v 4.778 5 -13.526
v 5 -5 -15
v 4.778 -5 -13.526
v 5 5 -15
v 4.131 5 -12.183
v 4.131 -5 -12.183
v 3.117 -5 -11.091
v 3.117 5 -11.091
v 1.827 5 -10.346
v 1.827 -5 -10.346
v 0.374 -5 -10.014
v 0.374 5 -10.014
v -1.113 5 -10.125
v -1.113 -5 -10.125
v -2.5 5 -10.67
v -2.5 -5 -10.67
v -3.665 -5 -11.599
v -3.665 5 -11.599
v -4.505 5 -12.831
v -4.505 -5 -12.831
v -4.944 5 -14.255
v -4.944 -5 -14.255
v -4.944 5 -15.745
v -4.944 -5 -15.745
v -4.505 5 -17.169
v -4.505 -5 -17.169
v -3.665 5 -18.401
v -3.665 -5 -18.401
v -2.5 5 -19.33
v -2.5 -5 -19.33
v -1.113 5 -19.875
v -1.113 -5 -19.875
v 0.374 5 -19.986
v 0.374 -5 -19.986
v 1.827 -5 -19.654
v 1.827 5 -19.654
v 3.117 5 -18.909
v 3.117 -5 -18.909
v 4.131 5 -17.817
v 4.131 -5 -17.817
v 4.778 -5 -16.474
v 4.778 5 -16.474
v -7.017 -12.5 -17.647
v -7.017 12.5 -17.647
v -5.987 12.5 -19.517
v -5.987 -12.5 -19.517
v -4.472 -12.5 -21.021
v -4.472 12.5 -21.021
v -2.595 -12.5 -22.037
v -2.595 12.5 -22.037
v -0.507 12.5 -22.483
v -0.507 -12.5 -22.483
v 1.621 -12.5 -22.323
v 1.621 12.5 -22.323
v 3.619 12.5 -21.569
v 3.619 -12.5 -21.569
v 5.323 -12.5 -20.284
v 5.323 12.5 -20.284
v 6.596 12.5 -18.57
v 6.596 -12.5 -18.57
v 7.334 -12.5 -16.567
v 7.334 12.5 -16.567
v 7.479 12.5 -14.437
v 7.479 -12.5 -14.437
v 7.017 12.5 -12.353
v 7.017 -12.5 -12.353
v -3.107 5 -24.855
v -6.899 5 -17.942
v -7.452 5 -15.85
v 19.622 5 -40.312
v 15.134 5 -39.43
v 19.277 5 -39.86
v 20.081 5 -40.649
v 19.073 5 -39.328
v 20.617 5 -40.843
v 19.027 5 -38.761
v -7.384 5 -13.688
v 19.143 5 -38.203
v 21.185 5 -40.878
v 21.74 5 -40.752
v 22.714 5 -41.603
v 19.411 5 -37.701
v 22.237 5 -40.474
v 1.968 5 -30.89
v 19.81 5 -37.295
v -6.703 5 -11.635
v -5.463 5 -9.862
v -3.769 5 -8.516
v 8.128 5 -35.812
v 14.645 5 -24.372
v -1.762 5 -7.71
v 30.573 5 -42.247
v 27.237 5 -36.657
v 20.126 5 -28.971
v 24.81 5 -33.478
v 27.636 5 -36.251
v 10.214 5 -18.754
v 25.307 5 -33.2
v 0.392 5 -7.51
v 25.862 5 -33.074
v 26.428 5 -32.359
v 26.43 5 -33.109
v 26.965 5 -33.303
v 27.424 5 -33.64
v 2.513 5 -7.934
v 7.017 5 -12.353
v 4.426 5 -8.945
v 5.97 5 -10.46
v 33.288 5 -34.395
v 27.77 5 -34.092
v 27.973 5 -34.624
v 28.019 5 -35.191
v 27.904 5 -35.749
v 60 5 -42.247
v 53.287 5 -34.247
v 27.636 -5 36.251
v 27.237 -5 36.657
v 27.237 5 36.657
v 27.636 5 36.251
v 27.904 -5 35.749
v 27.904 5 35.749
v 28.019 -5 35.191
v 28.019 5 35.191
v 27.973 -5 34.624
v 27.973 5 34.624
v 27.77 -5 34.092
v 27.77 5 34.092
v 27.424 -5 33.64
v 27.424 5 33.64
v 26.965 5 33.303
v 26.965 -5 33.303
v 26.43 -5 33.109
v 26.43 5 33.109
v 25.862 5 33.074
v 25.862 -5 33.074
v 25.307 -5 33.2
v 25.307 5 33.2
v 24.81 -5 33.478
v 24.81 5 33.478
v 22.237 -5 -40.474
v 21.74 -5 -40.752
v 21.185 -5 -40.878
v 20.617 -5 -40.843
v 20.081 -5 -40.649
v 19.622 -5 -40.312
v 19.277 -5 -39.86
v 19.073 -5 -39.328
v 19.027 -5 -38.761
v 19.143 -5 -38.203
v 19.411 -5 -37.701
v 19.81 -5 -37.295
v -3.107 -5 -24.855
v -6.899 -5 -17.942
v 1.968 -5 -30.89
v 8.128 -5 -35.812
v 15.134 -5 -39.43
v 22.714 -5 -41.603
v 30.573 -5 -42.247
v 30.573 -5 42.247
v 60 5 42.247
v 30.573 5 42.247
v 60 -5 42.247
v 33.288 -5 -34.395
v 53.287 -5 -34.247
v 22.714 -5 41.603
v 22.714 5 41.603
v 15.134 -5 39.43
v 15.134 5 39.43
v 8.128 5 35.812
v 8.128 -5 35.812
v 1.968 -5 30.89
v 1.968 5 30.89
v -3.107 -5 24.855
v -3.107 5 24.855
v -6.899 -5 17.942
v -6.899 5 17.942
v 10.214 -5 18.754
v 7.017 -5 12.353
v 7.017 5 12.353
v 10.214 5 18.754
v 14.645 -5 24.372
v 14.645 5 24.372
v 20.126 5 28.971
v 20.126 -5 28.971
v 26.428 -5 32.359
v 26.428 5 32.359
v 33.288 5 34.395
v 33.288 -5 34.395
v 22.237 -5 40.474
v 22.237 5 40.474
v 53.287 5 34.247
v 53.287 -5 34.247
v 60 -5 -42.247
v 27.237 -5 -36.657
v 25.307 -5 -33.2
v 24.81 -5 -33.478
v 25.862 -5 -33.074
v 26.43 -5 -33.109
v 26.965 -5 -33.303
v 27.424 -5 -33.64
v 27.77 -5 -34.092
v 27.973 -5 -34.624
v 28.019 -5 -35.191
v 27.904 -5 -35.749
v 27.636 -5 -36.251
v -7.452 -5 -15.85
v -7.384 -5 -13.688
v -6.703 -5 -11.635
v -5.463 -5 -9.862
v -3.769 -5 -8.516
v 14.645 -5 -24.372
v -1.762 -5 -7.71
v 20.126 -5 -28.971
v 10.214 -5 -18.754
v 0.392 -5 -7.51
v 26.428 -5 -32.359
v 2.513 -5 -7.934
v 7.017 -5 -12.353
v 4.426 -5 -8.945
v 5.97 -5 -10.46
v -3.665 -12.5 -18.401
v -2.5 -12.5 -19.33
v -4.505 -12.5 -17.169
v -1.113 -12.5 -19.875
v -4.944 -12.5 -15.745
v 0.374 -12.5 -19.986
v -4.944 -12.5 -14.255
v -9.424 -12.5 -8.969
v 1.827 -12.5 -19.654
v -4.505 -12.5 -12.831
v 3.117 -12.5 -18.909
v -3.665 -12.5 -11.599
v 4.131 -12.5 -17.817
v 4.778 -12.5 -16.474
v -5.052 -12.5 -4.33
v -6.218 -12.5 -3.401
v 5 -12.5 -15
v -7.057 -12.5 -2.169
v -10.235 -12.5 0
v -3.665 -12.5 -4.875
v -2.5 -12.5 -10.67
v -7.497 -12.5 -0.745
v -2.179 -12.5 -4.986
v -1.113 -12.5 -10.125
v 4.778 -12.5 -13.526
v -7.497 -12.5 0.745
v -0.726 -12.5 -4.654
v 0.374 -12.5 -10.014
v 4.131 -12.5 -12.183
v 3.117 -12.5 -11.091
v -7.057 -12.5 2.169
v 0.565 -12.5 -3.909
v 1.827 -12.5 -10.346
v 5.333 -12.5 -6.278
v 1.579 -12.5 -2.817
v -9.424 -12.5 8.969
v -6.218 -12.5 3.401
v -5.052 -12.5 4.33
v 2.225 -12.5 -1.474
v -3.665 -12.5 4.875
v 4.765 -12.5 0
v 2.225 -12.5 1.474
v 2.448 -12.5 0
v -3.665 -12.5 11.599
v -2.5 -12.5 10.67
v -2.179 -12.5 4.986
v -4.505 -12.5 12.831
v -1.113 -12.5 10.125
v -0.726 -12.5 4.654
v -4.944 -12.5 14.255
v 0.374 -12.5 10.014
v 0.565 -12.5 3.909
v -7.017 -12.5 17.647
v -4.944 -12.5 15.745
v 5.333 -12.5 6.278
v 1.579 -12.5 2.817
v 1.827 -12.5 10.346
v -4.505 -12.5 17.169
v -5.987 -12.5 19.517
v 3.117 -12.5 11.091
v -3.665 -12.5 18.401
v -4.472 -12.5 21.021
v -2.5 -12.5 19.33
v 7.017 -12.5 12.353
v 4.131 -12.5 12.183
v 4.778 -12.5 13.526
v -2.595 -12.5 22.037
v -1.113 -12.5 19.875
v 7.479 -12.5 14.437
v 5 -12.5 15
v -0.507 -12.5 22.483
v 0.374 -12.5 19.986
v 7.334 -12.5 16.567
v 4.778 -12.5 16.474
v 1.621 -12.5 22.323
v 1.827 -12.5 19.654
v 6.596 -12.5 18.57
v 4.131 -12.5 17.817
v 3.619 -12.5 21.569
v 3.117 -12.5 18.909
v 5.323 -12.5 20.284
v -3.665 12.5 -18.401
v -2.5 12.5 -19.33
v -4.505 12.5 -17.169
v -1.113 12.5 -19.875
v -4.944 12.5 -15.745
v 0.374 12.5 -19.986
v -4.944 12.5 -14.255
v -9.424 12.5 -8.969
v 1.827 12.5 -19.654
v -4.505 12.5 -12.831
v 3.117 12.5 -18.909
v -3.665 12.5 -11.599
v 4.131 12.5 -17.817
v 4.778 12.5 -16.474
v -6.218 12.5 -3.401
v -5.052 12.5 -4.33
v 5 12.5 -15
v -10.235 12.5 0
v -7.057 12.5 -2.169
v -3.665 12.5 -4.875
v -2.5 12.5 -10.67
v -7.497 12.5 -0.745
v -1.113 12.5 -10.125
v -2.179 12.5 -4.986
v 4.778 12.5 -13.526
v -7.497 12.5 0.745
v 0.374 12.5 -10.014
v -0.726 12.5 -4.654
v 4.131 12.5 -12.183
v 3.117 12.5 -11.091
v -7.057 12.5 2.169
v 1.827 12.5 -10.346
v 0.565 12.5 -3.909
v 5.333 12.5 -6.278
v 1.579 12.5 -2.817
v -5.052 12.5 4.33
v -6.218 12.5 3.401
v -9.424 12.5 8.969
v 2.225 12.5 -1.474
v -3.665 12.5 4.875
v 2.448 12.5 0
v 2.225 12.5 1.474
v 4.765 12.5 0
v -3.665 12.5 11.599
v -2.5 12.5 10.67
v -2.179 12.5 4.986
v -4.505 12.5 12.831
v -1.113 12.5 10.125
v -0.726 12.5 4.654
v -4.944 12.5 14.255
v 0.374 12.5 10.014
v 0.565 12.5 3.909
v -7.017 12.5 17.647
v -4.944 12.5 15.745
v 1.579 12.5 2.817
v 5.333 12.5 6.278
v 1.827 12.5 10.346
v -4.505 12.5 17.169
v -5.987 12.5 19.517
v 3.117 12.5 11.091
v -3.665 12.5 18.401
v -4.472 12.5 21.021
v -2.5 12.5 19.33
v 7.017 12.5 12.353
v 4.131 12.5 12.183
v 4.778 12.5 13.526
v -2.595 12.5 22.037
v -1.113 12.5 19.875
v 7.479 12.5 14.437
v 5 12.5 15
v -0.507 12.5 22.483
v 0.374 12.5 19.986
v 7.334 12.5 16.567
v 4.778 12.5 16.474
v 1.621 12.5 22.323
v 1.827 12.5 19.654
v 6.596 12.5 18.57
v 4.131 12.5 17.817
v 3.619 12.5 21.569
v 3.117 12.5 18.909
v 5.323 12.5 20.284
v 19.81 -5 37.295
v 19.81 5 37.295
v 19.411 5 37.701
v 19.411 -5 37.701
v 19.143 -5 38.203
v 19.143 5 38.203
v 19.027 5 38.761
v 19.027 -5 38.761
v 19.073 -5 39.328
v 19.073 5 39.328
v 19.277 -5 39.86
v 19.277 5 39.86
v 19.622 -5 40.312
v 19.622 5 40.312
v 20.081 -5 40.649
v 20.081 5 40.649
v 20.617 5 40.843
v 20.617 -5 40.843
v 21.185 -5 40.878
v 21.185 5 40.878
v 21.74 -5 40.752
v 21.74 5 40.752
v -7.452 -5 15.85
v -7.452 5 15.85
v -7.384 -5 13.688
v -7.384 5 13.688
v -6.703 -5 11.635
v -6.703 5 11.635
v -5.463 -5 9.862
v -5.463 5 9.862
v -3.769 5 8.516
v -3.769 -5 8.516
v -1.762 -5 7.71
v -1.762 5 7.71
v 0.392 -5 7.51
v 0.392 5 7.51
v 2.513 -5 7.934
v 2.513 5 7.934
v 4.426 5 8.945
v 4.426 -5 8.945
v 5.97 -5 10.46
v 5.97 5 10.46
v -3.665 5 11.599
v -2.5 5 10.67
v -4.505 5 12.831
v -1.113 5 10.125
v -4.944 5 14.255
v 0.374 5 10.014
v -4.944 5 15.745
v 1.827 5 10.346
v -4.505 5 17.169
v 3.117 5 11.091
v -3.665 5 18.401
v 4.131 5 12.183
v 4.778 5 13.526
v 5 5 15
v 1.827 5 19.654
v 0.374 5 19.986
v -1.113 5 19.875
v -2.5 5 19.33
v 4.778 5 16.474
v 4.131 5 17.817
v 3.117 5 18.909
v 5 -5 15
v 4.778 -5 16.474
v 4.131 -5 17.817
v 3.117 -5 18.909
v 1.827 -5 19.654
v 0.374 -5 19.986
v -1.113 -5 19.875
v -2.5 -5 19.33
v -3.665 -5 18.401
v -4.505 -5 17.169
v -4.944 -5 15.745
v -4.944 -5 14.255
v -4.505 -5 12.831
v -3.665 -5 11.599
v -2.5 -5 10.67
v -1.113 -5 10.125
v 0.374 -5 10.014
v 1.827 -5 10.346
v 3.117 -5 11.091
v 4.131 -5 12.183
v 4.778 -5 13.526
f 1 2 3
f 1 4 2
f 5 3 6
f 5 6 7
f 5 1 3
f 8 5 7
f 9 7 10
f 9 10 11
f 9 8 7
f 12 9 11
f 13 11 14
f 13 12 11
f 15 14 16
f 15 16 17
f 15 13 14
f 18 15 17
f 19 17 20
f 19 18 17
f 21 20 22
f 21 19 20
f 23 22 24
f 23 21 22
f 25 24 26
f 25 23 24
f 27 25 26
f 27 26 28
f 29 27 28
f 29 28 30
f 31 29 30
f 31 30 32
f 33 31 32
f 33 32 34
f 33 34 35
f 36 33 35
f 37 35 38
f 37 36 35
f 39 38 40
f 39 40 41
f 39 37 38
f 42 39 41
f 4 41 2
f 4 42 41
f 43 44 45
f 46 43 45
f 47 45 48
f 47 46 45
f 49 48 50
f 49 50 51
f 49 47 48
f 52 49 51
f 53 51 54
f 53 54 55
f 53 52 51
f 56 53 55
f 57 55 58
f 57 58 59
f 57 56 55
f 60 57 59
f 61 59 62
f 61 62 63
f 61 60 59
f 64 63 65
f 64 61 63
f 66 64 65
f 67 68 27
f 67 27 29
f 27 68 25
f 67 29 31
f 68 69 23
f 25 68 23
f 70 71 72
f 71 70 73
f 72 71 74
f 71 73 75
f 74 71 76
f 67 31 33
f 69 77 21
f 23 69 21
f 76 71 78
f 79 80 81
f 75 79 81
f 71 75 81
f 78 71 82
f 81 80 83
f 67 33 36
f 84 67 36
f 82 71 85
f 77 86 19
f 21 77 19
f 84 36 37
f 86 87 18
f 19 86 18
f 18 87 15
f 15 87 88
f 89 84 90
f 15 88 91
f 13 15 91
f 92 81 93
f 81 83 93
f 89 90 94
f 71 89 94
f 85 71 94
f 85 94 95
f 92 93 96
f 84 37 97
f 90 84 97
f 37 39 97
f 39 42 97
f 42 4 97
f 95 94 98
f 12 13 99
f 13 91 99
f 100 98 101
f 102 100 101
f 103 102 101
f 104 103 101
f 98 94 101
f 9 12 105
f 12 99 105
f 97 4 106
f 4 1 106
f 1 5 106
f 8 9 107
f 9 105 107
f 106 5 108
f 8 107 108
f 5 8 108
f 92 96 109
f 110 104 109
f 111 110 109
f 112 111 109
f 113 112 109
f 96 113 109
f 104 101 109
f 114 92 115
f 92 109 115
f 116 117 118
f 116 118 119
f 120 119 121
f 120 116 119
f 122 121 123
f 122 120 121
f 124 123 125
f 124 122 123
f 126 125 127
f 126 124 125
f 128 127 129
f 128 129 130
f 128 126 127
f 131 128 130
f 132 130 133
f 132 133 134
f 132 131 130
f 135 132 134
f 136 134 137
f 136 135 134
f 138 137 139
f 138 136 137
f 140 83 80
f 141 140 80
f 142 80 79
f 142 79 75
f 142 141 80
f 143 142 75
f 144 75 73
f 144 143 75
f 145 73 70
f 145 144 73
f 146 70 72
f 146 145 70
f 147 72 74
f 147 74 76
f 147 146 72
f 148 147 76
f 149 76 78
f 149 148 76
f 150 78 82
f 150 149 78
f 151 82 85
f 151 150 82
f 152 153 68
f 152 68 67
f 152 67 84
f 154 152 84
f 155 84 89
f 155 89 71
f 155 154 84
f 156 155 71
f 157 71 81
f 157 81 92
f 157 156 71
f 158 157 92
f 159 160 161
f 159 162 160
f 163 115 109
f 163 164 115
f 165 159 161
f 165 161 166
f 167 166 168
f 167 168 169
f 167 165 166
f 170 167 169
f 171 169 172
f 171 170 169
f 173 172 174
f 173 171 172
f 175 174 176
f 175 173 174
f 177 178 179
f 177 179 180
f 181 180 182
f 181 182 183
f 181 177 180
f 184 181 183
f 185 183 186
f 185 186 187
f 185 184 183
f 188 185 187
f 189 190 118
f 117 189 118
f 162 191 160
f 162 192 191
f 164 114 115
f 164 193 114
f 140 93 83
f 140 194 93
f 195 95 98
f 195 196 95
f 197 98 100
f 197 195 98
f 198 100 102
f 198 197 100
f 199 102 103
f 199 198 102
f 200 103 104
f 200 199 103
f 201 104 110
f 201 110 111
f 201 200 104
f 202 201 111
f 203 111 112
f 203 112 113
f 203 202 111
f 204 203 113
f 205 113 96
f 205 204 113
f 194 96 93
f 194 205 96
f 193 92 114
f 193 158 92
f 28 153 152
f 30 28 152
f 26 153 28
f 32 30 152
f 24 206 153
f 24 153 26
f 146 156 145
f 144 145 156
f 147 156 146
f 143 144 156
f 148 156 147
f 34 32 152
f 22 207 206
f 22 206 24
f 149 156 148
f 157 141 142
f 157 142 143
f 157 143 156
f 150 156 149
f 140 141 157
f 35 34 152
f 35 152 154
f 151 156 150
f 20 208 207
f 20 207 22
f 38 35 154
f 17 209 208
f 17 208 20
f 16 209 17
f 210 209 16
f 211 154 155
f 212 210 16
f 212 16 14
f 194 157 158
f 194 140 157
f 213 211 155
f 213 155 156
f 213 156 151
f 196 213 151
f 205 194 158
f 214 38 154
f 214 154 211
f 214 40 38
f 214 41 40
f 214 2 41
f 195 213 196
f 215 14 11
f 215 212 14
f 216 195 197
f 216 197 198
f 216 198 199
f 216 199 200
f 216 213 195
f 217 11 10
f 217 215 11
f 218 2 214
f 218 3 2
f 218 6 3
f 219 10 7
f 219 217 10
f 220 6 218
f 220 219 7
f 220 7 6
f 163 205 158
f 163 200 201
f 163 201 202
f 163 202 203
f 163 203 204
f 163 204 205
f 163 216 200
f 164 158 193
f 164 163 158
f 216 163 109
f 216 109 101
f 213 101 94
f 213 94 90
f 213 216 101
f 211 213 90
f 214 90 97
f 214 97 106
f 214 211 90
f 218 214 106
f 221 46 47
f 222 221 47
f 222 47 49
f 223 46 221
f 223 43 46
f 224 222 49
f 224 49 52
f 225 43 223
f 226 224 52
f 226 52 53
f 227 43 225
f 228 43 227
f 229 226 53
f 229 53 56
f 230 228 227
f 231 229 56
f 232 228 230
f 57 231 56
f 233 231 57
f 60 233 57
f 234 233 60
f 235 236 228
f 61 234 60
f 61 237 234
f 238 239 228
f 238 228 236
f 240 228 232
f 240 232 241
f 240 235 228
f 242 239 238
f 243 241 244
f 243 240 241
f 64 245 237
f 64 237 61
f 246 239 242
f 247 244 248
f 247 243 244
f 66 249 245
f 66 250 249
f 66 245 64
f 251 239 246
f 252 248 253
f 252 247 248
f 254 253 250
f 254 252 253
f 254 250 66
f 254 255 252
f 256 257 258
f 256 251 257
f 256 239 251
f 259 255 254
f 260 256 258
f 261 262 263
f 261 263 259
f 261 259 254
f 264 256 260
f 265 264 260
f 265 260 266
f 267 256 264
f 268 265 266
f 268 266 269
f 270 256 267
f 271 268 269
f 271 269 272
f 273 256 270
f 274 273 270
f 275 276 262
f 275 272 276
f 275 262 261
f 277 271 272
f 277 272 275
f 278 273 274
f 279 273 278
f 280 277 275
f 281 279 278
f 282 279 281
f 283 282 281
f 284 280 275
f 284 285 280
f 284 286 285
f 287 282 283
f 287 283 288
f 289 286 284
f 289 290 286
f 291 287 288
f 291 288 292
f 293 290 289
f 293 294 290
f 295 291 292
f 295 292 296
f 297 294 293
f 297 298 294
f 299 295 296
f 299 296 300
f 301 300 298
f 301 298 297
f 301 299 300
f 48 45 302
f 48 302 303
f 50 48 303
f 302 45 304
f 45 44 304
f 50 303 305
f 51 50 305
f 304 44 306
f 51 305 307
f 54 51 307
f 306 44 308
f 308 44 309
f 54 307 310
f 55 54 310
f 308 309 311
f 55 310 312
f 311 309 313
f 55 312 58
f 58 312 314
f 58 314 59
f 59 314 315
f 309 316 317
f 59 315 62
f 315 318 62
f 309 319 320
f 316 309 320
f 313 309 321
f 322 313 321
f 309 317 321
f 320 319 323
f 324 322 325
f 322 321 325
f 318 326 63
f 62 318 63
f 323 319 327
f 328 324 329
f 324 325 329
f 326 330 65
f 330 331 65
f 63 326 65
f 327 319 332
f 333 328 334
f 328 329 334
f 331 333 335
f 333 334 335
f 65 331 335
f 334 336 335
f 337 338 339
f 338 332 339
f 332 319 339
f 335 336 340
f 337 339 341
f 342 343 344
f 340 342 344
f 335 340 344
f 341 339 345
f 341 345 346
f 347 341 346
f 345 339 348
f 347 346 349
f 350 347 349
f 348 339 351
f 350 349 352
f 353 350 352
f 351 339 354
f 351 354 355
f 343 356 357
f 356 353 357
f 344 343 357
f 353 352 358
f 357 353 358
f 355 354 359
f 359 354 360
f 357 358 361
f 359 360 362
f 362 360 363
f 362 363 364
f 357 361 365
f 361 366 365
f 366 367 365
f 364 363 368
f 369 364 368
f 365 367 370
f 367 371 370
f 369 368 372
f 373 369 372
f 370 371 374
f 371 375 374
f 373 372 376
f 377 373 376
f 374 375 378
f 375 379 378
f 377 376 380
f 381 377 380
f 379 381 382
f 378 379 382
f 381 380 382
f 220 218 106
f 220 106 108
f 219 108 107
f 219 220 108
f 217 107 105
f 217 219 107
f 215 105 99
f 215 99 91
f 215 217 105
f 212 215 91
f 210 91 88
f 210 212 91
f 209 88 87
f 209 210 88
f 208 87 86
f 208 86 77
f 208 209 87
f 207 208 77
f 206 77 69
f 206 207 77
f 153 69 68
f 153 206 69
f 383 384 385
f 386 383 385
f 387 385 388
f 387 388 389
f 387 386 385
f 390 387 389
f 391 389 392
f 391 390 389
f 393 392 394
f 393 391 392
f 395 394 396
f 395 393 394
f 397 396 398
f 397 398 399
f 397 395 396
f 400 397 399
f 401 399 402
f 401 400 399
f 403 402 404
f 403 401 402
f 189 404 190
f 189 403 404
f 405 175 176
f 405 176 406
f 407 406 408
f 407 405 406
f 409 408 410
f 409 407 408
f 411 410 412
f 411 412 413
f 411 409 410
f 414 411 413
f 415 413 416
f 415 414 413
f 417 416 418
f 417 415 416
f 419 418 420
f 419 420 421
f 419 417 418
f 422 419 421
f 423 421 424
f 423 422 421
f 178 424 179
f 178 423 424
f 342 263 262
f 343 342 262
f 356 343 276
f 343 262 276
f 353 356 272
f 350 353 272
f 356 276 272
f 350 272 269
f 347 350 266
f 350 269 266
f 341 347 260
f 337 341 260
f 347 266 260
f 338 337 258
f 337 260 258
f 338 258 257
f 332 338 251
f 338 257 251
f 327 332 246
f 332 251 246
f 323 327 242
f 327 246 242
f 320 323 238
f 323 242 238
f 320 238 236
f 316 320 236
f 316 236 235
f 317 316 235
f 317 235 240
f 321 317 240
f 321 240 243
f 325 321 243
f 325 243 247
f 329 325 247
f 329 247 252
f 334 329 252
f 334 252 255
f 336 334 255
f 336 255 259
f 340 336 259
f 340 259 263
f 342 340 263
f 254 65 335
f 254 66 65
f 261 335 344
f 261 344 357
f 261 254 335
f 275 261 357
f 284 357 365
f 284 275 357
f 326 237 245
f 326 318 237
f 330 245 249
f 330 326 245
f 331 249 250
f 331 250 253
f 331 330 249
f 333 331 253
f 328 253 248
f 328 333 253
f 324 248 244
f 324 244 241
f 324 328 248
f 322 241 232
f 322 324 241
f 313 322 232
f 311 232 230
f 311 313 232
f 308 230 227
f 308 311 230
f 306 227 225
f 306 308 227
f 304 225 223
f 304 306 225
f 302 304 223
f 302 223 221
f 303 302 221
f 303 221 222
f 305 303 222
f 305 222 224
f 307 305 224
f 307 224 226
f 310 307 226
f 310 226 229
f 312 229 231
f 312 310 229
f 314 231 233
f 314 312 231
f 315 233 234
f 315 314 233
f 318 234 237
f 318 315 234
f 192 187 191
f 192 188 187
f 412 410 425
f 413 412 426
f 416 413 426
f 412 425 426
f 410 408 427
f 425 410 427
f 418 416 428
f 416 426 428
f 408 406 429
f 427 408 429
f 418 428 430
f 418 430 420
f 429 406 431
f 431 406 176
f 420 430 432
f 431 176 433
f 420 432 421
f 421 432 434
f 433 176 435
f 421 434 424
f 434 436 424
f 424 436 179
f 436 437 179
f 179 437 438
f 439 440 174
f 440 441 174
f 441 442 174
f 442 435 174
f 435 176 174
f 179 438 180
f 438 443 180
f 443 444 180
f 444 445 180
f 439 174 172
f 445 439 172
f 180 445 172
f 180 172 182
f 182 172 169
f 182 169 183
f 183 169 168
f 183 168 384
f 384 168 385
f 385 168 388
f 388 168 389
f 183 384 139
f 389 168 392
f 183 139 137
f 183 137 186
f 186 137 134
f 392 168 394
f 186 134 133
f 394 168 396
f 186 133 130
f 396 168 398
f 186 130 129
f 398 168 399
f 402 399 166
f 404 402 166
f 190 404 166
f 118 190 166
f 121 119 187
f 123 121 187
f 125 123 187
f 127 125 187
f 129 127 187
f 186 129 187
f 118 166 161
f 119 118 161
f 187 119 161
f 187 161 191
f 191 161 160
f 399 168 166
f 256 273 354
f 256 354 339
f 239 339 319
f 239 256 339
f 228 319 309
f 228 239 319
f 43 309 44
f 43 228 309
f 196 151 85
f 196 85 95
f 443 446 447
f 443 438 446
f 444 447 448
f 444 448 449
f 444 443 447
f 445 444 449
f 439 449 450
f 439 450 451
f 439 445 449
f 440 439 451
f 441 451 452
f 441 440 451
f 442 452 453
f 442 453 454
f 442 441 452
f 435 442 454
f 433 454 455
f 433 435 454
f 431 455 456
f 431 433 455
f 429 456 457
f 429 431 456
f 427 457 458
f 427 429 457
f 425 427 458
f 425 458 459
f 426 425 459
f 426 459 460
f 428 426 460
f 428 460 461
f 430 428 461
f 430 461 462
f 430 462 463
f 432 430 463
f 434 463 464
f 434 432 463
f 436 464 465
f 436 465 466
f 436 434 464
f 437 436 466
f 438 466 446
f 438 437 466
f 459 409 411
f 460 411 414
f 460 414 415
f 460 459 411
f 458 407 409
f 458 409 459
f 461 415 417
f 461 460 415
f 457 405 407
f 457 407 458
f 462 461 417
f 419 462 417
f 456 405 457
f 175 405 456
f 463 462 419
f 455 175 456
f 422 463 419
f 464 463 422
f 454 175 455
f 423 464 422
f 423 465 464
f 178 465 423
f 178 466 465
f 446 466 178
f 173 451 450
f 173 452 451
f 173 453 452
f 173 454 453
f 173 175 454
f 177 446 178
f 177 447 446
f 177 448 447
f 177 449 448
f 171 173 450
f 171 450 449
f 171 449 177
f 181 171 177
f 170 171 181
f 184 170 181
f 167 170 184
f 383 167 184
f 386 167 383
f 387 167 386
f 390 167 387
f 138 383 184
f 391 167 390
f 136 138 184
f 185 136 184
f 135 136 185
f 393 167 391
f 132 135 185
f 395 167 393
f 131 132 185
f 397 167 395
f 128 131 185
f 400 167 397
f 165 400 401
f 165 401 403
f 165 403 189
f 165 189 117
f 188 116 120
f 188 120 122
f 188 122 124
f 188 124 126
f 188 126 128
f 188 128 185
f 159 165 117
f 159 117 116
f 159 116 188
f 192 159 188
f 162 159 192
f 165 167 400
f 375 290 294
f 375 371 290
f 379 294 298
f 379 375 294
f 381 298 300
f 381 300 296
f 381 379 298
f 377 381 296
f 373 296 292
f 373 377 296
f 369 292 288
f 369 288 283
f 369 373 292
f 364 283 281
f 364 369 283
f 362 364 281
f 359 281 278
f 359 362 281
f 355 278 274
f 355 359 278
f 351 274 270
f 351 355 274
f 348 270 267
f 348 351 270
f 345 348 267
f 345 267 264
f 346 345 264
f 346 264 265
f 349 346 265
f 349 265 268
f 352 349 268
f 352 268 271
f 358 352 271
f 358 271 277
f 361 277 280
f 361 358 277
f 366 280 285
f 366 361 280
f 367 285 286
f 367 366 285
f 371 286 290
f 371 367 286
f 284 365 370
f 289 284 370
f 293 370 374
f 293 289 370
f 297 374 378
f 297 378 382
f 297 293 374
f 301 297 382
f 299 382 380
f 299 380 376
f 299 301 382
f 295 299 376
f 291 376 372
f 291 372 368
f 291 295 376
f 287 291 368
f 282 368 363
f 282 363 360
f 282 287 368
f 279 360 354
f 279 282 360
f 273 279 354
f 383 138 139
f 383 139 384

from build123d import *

# Parameters (mm, degrees)
F0_R     = 5
F2_DEPTH = 12.5
F1_R     = 5
F3_DEPTH = 5
F4_R     = 5
F5_DEPTH = 25.001


with BuildPart() as f2:
    # F0 (on Front) → F2 (new body, symmetric)
    with BuildSketch(Plane.XZ):
        with BuildLine():
            ThreePointArc((7.0173413473, 12.3529411765), (2.6470588235, 22.0173413473), (-7.0173413473, 17.6470588235))
            ThreePointArc((-7.0173413473, 17.6470588235), (-10.2350656985, 0), (-7.0173413473, -17.6470588235))
            ThreePointArc((-7.0173413473, -17.6470588235), (2.6470588235, -22.0173413473), (7.0173413473, -12.3529411765))
            ThreePointArc((7.0173413473, -12.3529411765), (4.7649343015, 0), (7.0173413473, 12.3529411765))
        make_face()
        with Locations((0, -15)):
            Circle(F0_R, mode=Mode.SUBTRACT)
        with Locations((0, 15)):
            Circle(F0_R, mode=Mode.SUBTRACT)
    extrude(amount=F2_DEPTH, both=True)

    # F4 (on face) → F5 (cut, through all)
    with BuildSketch(Plane.XZ.offset(12.5)):
        with Locations((-2.5523768673, 0)):
            Circle(F4_R)
    extrude(amount=-F5_DEPTH, mode=Mode.SUBTRACT)


with BuildPart() as f3:
    # F1 (on Front) → F3 (new body, symmetric)
    with BuildSketch(Plane.XZ):
        with BuildLine():
            ThreePointArc((7.0173413473, -12.3529411765), (7.3783487348, -13.6546487642), (7.5, -15))
            ThreePointArc((7.5, -15), (1.5011658977, -22.3482311441), (-6.8990669193, -17.9415770673))
            ThreePointArc((-6.8990669193, -17.9415770673), (8.1283974759, -35.811672677), (30.5726815386, -42.247441175))
            Line((30.5726815386, -42.247441175), (60, -42.247441175))
            Line((60, -42.247441175), (53.2872029506, -34.247441175))
            Line((53.2872029506, -34.247441175), (33.2877505276, -34.3954370573))
            ThreePointArc((33.2877505276, -34.3954370573), (17.2679637609, -26.8120554321), (7.0173413473, -12.3529411765))
        make_face()
        with BuildLine():
            Line((19.8096867162, -37.2948042379), (24.8096867162, -33.4776914401))
            ThreePointArc((24.8096867162, -33.4776914401), (27.6129987803, -33.8537784927), (27.2369117277, -36.6570905568))
            Line((27.2369117277, -36.6570905568), (22.2369117277, -40.4742033546))
            ThreePointArc((22.2369117277, -40.4742033546), (19.4335996636, -40.098116302), (19.8096867162, -37.2948042379))
        make_face(mode=Mode.SUBTRACT)
        with BuildLine():
            ThreePointArc((-6.8990669193, -17.9415770673), (1.5011658977, -22.3482311441), (7.5, -15))
            ThreePointArc((7.5, -15), (7.3783487348, -13.6546487642), (7.0173413473, -12.3529411765))
            ThreePointArc((7.0173413473, -12.3529411765), (-2.794943647, -8.0402377907), (-6.8990669193, -17.9415770673))
        make_face()
        with Locations((0, -15)):
            Circle(F1_R, mode=Mode.SUBTRACT)
    extrude(amount=F3_DEPTH, both=True)


with BuildPart() as f3b:
    # F1 (on Front) → F3, piece 2 (new body, symmetric)
    with BuildSketch(Plane.XZ):
        with BuildLine():
            Line((60, 42.247441175), (30.5726815386, 42.247441175))
            ThreePointArc((30.5726815386, 42.247441175), (8.1283974759, 35.811672677), (-6.8990669193, 17.9415770673))
            ThreePointArc((-6.8990669193, 17.9415770673), (1.5011658977, 22.3482311441), (7.5, 15))
            ThreePointArc((7.5, 15), (7.3783487348, 13.6546487642), (7.0173413473, 12.3529411765))
            ThreePointArc((7.0173413473, 12.3529411765), (17.2679637609, 26.8120554321), (33.2877505276, 34.3954370573))
            Line((33.2877505276, 34.3954370573), (53.2872029506, 34.247441175))
            Line((53.2872029506, 34.247441175), (60, 42.247441175))
        make_face()
        with BuildLine():
            ThreePointArc((19.8096867162, 37.2948042379), (19.4335996636, 40.098116302), (22.2369117277, 40.4742033546))
            Line((22.2369117277, 40.4742033546), (27.2369117277, 36.6570905568))
            ThreePointArc((27.2369117277, 36.6570905568), (27.6129987803, 33.8537784927), (24.8096867162, 33.4776914401))
            Line((24.8096867162, 33.4776914401), (19.8096867162, 37.2948042379))
        make_face(mode=Mode.SUBTRACT)
        with BuildLine():
            ThreePointArc((7.5, 15), (1.5011658977, 22.3482311441), (-6.8990669193, 17.9415770673))
            ThreePointArc((-6.8990669193, 17.9415770673), (-2.794943647, 8.0402377907), (7.0173413473, 12.3529411765))
            ThreePointArc((7.0173413473, 12.3529411765), (7.3783487348, 13.6546487642), (7.5, 15))
        make_face()
        with Locations((0, 15)):
            Circle(F1_R, mode=Mode.SUBTRACT)
    extrude(amount=F3_DEPTH, both=True)


solid = Compound([f2.part, f3.part, f3b.part])
